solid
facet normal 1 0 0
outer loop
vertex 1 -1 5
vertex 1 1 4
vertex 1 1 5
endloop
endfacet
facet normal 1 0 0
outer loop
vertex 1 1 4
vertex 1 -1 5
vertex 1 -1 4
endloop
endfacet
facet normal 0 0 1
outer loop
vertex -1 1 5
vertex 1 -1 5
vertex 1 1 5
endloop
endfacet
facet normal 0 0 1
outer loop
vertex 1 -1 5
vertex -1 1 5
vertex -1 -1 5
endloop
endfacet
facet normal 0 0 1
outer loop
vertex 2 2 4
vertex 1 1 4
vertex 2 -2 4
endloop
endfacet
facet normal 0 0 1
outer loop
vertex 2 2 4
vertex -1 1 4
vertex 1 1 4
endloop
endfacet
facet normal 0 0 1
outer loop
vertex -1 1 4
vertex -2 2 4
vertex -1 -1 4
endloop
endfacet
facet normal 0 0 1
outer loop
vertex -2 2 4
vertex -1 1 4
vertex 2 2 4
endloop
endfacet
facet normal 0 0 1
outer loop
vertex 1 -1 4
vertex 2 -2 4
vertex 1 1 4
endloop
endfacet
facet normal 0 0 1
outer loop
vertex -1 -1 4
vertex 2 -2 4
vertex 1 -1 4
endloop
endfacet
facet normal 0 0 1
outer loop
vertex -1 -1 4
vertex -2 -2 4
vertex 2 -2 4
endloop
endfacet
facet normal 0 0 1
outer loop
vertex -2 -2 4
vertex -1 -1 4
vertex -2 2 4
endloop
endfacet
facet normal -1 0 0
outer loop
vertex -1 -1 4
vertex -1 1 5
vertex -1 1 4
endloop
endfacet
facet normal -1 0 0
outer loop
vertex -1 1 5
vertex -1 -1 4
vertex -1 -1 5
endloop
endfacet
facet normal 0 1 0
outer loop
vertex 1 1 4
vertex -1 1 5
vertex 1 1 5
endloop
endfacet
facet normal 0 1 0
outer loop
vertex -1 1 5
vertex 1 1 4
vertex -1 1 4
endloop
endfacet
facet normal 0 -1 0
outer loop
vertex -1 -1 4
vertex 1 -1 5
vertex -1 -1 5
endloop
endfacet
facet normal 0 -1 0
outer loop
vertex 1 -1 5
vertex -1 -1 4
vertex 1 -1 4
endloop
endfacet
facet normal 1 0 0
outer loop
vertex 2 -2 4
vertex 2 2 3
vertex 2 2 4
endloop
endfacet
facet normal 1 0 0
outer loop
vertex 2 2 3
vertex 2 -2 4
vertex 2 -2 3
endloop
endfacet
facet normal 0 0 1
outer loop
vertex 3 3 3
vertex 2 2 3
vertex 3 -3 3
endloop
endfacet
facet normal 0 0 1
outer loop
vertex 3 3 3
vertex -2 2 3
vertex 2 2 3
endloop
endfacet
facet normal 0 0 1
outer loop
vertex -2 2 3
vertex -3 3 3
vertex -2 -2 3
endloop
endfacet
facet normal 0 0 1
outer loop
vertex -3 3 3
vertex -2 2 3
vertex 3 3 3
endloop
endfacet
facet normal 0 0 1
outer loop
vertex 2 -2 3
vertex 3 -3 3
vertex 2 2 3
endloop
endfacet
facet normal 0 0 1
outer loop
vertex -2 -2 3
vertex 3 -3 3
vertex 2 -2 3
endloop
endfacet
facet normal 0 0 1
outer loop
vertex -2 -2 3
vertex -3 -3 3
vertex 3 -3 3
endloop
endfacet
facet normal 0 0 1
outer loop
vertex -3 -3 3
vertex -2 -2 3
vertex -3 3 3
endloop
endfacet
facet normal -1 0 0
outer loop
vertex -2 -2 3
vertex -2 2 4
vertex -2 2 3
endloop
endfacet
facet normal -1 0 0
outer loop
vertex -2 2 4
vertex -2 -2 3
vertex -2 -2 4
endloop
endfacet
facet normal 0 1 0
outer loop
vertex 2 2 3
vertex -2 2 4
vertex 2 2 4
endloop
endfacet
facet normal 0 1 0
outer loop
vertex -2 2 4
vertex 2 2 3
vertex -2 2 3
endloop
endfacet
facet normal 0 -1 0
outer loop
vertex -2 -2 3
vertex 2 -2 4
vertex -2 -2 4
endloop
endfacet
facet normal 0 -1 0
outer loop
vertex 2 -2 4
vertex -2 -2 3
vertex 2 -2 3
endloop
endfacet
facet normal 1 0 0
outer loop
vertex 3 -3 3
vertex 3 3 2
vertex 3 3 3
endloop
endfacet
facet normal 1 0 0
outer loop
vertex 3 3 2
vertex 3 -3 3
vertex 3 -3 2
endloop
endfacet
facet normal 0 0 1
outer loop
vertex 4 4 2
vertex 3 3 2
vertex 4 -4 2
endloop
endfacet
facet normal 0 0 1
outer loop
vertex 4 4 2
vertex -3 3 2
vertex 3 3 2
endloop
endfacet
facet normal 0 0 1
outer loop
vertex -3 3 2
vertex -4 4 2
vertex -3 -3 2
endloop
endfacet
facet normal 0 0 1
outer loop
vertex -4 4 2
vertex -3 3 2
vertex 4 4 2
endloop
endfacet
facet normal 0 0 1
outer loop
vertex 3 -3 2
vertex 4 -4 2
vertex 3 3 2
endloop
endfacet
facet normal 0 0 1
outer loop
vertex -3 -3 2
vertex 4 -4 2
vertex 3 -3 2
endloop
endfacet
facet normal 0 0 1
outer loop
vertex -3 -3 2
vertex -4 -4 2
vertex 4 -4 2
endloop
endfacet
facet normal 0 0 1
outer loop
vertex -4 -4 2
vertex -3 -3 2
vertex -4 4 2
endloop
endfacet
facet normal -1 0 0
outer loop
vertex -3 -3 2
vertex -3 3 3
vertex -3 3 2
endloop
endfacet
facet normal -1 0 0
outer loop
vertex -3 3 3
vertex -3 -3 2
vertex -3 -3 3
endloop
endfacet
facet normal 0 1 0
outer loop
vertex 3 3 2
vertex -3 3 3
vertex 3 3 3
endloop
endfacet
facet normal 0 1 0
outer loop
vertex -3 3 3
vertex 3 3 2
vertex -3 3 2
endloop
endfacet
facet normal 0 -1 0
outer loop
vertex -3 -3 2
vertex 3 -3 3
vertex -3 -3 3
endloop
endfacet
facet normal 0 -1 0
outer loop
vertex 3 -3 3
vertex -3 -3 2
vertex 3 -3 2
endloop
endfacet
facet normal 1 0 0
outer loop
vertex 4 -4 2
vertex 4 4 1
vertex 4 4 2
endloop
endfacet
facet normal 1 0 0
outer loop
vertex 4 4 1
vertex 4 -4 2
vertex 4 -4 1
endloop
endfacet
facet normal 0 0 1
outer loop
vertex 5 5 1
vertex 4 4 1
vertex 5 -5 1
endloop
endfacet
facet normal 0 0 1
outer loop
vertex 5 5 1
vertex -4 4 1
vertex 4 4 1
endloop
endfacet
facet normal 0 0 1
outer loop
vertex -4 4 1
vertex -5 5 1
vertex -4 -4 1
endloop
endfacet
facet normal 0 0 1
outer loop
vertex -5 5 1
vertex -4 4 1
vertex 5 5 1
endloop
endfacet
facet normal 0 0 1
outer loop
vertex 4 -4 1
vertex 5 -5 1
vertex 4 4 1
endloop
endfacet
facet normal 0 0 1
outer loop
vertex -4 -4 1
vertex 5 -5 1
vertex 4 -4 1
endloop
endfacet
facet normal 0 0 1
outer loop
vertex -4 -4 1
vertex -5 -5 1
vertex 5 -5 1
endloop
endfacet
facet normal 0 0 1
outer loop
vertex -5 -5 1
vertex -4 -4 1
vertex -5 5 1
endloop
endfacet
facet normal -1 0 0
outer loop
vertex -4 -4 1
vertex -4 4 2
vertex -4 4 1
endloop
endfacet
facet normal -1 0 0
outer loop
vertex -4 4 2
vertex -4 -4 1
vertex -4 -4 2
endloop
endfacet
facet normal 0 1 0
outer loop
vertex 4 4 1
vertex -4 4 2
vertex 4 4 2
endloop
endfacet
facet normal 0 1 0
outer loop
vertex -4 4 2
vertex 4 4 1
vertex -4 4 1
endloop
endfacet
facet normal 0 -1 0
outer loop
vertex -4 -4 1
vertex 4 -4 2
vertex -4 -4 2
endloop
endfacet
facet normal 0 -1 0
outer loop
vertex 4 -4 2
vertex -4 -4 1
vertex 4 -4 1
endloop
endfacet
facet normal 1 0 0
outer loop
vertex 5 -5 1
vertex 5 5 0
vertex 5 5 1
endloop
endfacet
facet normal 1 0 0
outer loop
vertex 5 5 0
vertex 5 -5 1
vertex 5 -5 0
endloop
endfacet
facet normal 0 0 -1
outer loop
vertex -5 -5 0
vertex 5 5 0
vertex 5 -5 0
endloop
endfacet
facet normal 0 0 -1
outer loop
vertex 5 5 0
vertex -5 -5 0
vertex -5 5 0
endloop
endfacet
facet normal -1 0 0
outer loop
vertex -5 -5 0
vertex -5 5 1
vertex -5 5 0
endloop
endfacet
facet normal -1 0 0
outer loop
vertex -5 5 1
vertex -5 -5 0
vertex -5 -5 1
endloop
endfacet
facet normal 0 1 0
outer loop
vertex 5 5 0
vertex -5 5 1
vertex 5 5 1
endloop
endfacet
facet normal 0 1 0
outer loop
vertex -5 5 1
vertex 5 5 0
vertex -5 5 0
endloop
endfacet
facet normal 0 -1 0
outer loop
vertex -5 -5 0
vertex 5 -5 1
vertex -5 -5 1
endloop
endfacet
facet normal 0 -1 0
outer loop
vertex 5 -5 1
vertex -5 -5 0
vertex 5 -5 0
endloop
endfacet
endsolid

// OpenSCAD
union() {
	cube(size = [0, 0, 0]);
	translate(v = [-1.0, -1.0, 4]) {
		cube(size = [2, 2, 1]);
	}
	translate(v = [-2.0, -2.0, 3]) {
		cube(size = [4, 4, 1]);
	}
	translate(v = [-3.0, -3.0, 2]) {
		cube(size = [6, 6, 1]);
	}
	translate(v = [-4.0, -4.0, 1]) {
		cube(size = [8, 8, 1]);
	}
	translate(v = [-5.0, -5.0, 0]) {
		cube(size = [10, 10, 1]);
	}
}
